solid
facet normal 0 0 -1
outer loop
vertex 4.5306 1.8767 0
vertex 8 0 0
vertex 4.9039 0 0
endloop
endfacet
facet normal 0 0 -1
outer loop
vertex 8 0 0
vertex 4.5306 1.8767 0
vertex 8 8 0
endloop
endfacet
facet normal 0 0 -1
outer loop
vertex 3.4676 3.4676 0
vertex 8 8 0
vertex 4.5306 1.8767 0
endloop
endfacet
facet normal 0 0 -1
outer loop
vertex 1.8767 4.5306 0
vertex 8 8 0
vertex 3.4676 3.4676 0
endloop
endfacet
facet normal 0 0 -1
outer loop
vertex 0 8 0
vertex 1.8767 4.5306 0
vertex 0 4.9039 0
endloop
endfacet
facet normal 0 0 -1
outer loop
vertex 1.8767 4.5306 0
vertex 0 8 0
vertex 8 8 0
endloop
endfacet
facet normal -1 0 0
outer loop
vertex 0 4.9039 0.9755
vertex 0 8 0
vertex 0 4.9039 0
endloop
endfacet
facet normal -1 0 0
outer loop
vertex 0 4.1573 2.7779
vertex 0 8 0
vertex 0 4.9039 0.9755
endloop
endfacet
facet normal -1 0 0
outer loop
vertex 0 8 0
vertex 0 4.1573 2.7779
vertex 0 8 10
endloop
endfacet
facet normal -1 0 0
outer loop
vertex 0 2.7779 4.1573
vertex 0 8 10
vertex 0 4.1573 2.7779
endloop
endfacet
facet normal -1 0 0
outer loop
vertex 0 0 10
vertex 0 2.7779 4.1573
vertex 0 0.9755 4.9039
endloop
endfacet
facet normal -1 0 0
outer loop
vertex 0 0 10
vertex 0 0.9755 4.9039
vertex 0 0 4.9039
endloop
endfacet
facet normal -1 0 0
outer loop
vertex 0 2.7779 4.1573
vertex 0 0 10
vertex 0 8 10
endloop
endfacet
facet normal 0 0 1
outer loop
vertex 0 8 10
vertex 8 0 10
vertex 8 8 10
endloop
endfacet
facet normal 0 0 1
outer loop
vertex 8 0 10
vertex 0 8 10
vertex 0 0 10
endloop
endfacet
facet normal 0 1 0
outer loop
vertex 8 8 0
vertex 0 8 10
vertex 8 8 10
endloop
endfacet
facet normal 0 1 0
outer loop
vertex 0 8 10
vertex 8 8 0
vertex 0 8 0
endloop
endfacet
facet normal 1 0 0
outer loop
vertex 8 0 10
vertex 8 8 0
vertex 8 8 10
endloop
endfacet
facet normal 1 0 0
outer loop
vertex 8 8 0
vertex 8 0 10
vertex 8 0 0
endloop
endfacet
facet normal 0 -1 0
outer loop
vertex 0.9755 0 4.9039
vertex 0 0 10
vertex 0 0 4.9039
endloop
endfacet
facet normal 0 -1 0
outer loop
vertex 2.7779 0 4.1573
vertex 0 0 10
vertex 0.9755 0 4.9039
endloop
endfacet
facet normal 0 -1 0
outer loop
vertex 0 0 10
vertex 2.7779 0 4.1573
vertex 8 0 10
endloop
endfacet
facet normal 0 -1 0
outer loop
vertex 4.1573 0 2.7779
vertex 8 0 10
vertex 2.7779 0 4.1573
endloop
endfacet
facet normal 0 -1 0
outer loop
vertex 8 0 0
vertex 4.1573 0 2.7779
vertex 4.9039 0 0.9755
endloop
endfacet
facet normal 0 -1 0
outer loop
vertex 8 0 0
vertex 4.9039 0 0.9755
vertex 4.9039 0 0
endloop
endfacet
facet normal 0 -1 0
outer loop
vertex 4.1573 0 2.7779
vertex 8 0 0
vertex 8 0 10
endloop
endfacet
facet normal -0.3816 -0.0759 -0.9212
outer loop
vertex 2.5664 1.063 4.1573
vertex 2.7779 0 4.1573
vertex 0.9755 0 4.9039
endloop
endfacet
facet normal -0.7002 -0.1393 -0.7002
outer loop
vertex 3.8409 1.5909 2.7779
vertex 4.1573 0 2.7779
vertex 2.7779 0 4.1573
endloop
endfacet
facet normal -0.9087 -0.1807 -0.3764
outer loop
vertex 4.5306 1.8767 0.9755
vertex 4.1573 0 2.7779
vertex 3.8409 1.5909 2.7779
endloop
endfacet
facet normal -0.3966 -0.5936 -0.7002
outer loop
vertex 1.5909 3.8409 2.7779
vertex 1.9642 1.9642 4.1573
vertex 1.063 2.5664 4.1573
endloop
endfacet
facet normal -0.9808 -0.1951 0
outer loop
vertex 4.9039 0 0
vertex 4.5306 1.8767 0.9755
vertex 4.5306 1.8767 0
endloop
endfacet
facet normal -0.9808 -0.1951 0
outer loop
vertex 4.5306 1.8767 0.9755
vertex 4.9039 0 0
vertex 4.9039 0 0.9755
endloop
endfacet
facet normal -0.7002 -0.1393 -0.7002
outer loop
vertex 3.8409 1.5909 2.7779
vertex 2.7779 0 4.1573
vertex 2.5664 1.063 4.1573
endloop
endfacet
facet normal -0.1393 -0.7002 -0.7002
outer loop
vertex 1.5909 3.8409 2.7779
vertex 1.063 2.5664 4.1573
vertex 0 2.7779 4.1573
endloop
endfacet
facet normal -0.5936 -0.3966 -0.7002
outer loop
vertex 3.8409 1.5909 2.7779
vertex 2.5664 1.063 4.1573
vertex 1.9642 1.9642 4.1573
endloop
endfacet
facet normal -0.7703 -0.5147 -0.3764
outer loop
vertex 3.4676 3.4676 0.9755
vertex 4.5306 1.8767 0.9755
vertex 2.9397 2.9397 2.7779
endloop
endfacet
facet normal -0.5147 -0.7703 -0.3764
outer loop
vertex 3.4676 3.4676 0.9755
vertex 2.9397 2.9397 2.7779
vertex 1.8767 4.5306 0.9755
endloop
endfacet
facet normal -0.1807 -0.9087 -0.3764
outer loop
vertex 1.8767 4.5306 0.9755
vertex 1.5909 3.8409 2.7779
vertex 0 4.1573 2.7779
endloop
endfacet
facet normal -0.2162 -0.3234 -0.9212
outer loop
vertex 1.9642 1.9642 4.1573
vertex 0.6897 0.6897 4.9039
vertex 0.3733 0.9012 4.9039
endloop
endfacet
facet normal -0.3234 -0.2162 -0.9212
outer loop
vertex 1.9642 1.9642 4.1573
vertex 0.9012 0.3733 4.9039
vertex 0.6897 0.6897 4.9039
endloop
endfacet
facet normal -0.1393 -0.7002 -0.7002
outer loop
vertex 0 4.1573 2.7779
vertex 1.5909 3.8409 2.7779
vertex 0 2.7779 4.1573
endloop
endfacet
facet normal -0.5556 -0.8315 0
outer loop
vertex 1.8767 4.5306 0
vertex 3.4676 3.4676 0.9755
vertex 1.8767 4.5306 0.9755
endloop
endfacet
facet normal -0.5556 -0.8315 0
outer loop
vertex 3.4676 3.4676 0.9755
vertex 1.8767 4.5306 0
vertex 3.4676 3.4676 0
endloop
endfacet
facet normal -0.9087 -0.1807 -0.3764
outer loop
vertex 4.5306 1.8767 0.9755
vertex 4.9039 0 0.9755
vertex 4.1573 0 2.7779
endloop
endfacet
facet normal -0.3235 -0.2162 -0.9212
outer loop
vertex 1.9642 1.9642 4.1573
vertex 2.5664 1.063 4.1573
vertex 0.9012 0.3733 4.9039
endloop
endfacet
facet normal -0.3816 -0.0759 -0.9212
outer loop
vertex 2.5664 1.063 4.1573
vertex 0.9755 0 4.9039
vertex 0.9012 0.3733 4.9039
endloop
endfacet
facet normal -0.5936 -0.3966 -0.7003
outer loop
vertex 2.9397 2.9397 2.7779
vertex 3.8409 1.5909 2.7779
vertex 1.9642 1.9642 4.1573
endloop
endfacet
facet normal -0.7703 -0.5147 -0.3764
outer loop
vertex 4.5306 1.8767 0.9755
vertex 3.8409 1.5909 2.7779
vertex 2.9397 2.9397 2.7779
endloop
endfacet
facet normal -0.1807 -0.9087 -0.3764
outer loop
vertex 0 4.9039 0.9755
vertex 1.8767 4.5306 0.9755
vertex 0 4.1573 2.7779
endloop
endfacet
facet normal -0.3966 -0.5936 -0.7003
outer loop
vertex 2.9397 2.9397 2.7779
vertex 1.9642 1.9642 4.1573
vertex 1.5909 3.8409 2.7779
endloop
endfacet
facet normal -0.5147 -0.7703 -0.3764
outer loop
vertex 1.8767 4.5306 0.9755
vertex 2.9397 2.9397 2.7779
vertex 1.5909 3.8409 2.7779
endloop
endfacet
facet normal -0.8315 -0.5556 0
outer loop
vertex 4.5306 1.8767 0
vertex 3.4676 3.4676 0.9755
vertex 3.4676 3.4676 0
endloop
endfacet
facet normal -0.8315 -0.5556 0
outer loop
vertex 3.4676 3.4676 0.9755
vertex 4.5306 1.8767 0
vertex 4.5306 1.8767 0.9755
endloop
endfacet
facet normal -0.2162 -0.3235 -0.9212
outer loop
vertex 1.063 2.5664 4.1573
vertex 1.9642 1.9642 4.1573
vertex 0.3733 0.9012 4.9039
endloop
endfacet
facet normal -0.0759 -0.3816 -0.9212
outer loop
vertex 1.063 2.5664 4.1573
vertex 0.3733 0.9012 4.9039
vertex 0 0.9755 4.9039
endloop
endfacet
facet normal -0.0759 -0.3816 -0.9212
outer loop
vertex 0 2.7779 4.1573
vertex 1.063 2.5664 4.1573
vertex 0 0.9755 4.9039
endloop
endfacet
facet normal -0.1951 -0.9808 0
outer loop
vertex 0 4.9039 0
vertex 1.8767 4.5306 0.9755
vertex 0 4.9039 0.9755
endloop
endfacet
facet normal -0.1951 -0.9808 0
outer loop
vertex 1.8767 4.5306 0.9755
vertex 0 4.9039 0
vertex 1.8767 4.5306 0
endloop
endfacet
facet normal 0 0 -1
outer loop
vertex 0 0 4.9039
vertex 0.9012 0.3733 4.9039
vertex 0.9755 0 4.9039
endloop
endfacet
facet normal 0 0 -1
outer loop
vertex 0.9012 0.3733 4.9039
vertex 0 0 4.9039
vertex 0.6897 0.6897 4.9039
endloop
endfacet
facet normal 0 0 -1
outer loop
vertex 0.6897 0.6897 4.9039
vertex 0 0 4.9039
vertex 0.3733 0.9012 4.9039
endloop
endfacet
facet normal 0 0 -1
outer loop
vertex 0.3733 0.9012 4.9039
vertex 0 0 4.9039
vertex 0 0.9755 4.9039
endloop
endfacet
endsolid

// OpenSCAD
difference() {
    linear_extrude(height=10) {
        projection(cut = true) translate([0,0,-0.1]) cube(8);
    }
    sphere(5);
}
